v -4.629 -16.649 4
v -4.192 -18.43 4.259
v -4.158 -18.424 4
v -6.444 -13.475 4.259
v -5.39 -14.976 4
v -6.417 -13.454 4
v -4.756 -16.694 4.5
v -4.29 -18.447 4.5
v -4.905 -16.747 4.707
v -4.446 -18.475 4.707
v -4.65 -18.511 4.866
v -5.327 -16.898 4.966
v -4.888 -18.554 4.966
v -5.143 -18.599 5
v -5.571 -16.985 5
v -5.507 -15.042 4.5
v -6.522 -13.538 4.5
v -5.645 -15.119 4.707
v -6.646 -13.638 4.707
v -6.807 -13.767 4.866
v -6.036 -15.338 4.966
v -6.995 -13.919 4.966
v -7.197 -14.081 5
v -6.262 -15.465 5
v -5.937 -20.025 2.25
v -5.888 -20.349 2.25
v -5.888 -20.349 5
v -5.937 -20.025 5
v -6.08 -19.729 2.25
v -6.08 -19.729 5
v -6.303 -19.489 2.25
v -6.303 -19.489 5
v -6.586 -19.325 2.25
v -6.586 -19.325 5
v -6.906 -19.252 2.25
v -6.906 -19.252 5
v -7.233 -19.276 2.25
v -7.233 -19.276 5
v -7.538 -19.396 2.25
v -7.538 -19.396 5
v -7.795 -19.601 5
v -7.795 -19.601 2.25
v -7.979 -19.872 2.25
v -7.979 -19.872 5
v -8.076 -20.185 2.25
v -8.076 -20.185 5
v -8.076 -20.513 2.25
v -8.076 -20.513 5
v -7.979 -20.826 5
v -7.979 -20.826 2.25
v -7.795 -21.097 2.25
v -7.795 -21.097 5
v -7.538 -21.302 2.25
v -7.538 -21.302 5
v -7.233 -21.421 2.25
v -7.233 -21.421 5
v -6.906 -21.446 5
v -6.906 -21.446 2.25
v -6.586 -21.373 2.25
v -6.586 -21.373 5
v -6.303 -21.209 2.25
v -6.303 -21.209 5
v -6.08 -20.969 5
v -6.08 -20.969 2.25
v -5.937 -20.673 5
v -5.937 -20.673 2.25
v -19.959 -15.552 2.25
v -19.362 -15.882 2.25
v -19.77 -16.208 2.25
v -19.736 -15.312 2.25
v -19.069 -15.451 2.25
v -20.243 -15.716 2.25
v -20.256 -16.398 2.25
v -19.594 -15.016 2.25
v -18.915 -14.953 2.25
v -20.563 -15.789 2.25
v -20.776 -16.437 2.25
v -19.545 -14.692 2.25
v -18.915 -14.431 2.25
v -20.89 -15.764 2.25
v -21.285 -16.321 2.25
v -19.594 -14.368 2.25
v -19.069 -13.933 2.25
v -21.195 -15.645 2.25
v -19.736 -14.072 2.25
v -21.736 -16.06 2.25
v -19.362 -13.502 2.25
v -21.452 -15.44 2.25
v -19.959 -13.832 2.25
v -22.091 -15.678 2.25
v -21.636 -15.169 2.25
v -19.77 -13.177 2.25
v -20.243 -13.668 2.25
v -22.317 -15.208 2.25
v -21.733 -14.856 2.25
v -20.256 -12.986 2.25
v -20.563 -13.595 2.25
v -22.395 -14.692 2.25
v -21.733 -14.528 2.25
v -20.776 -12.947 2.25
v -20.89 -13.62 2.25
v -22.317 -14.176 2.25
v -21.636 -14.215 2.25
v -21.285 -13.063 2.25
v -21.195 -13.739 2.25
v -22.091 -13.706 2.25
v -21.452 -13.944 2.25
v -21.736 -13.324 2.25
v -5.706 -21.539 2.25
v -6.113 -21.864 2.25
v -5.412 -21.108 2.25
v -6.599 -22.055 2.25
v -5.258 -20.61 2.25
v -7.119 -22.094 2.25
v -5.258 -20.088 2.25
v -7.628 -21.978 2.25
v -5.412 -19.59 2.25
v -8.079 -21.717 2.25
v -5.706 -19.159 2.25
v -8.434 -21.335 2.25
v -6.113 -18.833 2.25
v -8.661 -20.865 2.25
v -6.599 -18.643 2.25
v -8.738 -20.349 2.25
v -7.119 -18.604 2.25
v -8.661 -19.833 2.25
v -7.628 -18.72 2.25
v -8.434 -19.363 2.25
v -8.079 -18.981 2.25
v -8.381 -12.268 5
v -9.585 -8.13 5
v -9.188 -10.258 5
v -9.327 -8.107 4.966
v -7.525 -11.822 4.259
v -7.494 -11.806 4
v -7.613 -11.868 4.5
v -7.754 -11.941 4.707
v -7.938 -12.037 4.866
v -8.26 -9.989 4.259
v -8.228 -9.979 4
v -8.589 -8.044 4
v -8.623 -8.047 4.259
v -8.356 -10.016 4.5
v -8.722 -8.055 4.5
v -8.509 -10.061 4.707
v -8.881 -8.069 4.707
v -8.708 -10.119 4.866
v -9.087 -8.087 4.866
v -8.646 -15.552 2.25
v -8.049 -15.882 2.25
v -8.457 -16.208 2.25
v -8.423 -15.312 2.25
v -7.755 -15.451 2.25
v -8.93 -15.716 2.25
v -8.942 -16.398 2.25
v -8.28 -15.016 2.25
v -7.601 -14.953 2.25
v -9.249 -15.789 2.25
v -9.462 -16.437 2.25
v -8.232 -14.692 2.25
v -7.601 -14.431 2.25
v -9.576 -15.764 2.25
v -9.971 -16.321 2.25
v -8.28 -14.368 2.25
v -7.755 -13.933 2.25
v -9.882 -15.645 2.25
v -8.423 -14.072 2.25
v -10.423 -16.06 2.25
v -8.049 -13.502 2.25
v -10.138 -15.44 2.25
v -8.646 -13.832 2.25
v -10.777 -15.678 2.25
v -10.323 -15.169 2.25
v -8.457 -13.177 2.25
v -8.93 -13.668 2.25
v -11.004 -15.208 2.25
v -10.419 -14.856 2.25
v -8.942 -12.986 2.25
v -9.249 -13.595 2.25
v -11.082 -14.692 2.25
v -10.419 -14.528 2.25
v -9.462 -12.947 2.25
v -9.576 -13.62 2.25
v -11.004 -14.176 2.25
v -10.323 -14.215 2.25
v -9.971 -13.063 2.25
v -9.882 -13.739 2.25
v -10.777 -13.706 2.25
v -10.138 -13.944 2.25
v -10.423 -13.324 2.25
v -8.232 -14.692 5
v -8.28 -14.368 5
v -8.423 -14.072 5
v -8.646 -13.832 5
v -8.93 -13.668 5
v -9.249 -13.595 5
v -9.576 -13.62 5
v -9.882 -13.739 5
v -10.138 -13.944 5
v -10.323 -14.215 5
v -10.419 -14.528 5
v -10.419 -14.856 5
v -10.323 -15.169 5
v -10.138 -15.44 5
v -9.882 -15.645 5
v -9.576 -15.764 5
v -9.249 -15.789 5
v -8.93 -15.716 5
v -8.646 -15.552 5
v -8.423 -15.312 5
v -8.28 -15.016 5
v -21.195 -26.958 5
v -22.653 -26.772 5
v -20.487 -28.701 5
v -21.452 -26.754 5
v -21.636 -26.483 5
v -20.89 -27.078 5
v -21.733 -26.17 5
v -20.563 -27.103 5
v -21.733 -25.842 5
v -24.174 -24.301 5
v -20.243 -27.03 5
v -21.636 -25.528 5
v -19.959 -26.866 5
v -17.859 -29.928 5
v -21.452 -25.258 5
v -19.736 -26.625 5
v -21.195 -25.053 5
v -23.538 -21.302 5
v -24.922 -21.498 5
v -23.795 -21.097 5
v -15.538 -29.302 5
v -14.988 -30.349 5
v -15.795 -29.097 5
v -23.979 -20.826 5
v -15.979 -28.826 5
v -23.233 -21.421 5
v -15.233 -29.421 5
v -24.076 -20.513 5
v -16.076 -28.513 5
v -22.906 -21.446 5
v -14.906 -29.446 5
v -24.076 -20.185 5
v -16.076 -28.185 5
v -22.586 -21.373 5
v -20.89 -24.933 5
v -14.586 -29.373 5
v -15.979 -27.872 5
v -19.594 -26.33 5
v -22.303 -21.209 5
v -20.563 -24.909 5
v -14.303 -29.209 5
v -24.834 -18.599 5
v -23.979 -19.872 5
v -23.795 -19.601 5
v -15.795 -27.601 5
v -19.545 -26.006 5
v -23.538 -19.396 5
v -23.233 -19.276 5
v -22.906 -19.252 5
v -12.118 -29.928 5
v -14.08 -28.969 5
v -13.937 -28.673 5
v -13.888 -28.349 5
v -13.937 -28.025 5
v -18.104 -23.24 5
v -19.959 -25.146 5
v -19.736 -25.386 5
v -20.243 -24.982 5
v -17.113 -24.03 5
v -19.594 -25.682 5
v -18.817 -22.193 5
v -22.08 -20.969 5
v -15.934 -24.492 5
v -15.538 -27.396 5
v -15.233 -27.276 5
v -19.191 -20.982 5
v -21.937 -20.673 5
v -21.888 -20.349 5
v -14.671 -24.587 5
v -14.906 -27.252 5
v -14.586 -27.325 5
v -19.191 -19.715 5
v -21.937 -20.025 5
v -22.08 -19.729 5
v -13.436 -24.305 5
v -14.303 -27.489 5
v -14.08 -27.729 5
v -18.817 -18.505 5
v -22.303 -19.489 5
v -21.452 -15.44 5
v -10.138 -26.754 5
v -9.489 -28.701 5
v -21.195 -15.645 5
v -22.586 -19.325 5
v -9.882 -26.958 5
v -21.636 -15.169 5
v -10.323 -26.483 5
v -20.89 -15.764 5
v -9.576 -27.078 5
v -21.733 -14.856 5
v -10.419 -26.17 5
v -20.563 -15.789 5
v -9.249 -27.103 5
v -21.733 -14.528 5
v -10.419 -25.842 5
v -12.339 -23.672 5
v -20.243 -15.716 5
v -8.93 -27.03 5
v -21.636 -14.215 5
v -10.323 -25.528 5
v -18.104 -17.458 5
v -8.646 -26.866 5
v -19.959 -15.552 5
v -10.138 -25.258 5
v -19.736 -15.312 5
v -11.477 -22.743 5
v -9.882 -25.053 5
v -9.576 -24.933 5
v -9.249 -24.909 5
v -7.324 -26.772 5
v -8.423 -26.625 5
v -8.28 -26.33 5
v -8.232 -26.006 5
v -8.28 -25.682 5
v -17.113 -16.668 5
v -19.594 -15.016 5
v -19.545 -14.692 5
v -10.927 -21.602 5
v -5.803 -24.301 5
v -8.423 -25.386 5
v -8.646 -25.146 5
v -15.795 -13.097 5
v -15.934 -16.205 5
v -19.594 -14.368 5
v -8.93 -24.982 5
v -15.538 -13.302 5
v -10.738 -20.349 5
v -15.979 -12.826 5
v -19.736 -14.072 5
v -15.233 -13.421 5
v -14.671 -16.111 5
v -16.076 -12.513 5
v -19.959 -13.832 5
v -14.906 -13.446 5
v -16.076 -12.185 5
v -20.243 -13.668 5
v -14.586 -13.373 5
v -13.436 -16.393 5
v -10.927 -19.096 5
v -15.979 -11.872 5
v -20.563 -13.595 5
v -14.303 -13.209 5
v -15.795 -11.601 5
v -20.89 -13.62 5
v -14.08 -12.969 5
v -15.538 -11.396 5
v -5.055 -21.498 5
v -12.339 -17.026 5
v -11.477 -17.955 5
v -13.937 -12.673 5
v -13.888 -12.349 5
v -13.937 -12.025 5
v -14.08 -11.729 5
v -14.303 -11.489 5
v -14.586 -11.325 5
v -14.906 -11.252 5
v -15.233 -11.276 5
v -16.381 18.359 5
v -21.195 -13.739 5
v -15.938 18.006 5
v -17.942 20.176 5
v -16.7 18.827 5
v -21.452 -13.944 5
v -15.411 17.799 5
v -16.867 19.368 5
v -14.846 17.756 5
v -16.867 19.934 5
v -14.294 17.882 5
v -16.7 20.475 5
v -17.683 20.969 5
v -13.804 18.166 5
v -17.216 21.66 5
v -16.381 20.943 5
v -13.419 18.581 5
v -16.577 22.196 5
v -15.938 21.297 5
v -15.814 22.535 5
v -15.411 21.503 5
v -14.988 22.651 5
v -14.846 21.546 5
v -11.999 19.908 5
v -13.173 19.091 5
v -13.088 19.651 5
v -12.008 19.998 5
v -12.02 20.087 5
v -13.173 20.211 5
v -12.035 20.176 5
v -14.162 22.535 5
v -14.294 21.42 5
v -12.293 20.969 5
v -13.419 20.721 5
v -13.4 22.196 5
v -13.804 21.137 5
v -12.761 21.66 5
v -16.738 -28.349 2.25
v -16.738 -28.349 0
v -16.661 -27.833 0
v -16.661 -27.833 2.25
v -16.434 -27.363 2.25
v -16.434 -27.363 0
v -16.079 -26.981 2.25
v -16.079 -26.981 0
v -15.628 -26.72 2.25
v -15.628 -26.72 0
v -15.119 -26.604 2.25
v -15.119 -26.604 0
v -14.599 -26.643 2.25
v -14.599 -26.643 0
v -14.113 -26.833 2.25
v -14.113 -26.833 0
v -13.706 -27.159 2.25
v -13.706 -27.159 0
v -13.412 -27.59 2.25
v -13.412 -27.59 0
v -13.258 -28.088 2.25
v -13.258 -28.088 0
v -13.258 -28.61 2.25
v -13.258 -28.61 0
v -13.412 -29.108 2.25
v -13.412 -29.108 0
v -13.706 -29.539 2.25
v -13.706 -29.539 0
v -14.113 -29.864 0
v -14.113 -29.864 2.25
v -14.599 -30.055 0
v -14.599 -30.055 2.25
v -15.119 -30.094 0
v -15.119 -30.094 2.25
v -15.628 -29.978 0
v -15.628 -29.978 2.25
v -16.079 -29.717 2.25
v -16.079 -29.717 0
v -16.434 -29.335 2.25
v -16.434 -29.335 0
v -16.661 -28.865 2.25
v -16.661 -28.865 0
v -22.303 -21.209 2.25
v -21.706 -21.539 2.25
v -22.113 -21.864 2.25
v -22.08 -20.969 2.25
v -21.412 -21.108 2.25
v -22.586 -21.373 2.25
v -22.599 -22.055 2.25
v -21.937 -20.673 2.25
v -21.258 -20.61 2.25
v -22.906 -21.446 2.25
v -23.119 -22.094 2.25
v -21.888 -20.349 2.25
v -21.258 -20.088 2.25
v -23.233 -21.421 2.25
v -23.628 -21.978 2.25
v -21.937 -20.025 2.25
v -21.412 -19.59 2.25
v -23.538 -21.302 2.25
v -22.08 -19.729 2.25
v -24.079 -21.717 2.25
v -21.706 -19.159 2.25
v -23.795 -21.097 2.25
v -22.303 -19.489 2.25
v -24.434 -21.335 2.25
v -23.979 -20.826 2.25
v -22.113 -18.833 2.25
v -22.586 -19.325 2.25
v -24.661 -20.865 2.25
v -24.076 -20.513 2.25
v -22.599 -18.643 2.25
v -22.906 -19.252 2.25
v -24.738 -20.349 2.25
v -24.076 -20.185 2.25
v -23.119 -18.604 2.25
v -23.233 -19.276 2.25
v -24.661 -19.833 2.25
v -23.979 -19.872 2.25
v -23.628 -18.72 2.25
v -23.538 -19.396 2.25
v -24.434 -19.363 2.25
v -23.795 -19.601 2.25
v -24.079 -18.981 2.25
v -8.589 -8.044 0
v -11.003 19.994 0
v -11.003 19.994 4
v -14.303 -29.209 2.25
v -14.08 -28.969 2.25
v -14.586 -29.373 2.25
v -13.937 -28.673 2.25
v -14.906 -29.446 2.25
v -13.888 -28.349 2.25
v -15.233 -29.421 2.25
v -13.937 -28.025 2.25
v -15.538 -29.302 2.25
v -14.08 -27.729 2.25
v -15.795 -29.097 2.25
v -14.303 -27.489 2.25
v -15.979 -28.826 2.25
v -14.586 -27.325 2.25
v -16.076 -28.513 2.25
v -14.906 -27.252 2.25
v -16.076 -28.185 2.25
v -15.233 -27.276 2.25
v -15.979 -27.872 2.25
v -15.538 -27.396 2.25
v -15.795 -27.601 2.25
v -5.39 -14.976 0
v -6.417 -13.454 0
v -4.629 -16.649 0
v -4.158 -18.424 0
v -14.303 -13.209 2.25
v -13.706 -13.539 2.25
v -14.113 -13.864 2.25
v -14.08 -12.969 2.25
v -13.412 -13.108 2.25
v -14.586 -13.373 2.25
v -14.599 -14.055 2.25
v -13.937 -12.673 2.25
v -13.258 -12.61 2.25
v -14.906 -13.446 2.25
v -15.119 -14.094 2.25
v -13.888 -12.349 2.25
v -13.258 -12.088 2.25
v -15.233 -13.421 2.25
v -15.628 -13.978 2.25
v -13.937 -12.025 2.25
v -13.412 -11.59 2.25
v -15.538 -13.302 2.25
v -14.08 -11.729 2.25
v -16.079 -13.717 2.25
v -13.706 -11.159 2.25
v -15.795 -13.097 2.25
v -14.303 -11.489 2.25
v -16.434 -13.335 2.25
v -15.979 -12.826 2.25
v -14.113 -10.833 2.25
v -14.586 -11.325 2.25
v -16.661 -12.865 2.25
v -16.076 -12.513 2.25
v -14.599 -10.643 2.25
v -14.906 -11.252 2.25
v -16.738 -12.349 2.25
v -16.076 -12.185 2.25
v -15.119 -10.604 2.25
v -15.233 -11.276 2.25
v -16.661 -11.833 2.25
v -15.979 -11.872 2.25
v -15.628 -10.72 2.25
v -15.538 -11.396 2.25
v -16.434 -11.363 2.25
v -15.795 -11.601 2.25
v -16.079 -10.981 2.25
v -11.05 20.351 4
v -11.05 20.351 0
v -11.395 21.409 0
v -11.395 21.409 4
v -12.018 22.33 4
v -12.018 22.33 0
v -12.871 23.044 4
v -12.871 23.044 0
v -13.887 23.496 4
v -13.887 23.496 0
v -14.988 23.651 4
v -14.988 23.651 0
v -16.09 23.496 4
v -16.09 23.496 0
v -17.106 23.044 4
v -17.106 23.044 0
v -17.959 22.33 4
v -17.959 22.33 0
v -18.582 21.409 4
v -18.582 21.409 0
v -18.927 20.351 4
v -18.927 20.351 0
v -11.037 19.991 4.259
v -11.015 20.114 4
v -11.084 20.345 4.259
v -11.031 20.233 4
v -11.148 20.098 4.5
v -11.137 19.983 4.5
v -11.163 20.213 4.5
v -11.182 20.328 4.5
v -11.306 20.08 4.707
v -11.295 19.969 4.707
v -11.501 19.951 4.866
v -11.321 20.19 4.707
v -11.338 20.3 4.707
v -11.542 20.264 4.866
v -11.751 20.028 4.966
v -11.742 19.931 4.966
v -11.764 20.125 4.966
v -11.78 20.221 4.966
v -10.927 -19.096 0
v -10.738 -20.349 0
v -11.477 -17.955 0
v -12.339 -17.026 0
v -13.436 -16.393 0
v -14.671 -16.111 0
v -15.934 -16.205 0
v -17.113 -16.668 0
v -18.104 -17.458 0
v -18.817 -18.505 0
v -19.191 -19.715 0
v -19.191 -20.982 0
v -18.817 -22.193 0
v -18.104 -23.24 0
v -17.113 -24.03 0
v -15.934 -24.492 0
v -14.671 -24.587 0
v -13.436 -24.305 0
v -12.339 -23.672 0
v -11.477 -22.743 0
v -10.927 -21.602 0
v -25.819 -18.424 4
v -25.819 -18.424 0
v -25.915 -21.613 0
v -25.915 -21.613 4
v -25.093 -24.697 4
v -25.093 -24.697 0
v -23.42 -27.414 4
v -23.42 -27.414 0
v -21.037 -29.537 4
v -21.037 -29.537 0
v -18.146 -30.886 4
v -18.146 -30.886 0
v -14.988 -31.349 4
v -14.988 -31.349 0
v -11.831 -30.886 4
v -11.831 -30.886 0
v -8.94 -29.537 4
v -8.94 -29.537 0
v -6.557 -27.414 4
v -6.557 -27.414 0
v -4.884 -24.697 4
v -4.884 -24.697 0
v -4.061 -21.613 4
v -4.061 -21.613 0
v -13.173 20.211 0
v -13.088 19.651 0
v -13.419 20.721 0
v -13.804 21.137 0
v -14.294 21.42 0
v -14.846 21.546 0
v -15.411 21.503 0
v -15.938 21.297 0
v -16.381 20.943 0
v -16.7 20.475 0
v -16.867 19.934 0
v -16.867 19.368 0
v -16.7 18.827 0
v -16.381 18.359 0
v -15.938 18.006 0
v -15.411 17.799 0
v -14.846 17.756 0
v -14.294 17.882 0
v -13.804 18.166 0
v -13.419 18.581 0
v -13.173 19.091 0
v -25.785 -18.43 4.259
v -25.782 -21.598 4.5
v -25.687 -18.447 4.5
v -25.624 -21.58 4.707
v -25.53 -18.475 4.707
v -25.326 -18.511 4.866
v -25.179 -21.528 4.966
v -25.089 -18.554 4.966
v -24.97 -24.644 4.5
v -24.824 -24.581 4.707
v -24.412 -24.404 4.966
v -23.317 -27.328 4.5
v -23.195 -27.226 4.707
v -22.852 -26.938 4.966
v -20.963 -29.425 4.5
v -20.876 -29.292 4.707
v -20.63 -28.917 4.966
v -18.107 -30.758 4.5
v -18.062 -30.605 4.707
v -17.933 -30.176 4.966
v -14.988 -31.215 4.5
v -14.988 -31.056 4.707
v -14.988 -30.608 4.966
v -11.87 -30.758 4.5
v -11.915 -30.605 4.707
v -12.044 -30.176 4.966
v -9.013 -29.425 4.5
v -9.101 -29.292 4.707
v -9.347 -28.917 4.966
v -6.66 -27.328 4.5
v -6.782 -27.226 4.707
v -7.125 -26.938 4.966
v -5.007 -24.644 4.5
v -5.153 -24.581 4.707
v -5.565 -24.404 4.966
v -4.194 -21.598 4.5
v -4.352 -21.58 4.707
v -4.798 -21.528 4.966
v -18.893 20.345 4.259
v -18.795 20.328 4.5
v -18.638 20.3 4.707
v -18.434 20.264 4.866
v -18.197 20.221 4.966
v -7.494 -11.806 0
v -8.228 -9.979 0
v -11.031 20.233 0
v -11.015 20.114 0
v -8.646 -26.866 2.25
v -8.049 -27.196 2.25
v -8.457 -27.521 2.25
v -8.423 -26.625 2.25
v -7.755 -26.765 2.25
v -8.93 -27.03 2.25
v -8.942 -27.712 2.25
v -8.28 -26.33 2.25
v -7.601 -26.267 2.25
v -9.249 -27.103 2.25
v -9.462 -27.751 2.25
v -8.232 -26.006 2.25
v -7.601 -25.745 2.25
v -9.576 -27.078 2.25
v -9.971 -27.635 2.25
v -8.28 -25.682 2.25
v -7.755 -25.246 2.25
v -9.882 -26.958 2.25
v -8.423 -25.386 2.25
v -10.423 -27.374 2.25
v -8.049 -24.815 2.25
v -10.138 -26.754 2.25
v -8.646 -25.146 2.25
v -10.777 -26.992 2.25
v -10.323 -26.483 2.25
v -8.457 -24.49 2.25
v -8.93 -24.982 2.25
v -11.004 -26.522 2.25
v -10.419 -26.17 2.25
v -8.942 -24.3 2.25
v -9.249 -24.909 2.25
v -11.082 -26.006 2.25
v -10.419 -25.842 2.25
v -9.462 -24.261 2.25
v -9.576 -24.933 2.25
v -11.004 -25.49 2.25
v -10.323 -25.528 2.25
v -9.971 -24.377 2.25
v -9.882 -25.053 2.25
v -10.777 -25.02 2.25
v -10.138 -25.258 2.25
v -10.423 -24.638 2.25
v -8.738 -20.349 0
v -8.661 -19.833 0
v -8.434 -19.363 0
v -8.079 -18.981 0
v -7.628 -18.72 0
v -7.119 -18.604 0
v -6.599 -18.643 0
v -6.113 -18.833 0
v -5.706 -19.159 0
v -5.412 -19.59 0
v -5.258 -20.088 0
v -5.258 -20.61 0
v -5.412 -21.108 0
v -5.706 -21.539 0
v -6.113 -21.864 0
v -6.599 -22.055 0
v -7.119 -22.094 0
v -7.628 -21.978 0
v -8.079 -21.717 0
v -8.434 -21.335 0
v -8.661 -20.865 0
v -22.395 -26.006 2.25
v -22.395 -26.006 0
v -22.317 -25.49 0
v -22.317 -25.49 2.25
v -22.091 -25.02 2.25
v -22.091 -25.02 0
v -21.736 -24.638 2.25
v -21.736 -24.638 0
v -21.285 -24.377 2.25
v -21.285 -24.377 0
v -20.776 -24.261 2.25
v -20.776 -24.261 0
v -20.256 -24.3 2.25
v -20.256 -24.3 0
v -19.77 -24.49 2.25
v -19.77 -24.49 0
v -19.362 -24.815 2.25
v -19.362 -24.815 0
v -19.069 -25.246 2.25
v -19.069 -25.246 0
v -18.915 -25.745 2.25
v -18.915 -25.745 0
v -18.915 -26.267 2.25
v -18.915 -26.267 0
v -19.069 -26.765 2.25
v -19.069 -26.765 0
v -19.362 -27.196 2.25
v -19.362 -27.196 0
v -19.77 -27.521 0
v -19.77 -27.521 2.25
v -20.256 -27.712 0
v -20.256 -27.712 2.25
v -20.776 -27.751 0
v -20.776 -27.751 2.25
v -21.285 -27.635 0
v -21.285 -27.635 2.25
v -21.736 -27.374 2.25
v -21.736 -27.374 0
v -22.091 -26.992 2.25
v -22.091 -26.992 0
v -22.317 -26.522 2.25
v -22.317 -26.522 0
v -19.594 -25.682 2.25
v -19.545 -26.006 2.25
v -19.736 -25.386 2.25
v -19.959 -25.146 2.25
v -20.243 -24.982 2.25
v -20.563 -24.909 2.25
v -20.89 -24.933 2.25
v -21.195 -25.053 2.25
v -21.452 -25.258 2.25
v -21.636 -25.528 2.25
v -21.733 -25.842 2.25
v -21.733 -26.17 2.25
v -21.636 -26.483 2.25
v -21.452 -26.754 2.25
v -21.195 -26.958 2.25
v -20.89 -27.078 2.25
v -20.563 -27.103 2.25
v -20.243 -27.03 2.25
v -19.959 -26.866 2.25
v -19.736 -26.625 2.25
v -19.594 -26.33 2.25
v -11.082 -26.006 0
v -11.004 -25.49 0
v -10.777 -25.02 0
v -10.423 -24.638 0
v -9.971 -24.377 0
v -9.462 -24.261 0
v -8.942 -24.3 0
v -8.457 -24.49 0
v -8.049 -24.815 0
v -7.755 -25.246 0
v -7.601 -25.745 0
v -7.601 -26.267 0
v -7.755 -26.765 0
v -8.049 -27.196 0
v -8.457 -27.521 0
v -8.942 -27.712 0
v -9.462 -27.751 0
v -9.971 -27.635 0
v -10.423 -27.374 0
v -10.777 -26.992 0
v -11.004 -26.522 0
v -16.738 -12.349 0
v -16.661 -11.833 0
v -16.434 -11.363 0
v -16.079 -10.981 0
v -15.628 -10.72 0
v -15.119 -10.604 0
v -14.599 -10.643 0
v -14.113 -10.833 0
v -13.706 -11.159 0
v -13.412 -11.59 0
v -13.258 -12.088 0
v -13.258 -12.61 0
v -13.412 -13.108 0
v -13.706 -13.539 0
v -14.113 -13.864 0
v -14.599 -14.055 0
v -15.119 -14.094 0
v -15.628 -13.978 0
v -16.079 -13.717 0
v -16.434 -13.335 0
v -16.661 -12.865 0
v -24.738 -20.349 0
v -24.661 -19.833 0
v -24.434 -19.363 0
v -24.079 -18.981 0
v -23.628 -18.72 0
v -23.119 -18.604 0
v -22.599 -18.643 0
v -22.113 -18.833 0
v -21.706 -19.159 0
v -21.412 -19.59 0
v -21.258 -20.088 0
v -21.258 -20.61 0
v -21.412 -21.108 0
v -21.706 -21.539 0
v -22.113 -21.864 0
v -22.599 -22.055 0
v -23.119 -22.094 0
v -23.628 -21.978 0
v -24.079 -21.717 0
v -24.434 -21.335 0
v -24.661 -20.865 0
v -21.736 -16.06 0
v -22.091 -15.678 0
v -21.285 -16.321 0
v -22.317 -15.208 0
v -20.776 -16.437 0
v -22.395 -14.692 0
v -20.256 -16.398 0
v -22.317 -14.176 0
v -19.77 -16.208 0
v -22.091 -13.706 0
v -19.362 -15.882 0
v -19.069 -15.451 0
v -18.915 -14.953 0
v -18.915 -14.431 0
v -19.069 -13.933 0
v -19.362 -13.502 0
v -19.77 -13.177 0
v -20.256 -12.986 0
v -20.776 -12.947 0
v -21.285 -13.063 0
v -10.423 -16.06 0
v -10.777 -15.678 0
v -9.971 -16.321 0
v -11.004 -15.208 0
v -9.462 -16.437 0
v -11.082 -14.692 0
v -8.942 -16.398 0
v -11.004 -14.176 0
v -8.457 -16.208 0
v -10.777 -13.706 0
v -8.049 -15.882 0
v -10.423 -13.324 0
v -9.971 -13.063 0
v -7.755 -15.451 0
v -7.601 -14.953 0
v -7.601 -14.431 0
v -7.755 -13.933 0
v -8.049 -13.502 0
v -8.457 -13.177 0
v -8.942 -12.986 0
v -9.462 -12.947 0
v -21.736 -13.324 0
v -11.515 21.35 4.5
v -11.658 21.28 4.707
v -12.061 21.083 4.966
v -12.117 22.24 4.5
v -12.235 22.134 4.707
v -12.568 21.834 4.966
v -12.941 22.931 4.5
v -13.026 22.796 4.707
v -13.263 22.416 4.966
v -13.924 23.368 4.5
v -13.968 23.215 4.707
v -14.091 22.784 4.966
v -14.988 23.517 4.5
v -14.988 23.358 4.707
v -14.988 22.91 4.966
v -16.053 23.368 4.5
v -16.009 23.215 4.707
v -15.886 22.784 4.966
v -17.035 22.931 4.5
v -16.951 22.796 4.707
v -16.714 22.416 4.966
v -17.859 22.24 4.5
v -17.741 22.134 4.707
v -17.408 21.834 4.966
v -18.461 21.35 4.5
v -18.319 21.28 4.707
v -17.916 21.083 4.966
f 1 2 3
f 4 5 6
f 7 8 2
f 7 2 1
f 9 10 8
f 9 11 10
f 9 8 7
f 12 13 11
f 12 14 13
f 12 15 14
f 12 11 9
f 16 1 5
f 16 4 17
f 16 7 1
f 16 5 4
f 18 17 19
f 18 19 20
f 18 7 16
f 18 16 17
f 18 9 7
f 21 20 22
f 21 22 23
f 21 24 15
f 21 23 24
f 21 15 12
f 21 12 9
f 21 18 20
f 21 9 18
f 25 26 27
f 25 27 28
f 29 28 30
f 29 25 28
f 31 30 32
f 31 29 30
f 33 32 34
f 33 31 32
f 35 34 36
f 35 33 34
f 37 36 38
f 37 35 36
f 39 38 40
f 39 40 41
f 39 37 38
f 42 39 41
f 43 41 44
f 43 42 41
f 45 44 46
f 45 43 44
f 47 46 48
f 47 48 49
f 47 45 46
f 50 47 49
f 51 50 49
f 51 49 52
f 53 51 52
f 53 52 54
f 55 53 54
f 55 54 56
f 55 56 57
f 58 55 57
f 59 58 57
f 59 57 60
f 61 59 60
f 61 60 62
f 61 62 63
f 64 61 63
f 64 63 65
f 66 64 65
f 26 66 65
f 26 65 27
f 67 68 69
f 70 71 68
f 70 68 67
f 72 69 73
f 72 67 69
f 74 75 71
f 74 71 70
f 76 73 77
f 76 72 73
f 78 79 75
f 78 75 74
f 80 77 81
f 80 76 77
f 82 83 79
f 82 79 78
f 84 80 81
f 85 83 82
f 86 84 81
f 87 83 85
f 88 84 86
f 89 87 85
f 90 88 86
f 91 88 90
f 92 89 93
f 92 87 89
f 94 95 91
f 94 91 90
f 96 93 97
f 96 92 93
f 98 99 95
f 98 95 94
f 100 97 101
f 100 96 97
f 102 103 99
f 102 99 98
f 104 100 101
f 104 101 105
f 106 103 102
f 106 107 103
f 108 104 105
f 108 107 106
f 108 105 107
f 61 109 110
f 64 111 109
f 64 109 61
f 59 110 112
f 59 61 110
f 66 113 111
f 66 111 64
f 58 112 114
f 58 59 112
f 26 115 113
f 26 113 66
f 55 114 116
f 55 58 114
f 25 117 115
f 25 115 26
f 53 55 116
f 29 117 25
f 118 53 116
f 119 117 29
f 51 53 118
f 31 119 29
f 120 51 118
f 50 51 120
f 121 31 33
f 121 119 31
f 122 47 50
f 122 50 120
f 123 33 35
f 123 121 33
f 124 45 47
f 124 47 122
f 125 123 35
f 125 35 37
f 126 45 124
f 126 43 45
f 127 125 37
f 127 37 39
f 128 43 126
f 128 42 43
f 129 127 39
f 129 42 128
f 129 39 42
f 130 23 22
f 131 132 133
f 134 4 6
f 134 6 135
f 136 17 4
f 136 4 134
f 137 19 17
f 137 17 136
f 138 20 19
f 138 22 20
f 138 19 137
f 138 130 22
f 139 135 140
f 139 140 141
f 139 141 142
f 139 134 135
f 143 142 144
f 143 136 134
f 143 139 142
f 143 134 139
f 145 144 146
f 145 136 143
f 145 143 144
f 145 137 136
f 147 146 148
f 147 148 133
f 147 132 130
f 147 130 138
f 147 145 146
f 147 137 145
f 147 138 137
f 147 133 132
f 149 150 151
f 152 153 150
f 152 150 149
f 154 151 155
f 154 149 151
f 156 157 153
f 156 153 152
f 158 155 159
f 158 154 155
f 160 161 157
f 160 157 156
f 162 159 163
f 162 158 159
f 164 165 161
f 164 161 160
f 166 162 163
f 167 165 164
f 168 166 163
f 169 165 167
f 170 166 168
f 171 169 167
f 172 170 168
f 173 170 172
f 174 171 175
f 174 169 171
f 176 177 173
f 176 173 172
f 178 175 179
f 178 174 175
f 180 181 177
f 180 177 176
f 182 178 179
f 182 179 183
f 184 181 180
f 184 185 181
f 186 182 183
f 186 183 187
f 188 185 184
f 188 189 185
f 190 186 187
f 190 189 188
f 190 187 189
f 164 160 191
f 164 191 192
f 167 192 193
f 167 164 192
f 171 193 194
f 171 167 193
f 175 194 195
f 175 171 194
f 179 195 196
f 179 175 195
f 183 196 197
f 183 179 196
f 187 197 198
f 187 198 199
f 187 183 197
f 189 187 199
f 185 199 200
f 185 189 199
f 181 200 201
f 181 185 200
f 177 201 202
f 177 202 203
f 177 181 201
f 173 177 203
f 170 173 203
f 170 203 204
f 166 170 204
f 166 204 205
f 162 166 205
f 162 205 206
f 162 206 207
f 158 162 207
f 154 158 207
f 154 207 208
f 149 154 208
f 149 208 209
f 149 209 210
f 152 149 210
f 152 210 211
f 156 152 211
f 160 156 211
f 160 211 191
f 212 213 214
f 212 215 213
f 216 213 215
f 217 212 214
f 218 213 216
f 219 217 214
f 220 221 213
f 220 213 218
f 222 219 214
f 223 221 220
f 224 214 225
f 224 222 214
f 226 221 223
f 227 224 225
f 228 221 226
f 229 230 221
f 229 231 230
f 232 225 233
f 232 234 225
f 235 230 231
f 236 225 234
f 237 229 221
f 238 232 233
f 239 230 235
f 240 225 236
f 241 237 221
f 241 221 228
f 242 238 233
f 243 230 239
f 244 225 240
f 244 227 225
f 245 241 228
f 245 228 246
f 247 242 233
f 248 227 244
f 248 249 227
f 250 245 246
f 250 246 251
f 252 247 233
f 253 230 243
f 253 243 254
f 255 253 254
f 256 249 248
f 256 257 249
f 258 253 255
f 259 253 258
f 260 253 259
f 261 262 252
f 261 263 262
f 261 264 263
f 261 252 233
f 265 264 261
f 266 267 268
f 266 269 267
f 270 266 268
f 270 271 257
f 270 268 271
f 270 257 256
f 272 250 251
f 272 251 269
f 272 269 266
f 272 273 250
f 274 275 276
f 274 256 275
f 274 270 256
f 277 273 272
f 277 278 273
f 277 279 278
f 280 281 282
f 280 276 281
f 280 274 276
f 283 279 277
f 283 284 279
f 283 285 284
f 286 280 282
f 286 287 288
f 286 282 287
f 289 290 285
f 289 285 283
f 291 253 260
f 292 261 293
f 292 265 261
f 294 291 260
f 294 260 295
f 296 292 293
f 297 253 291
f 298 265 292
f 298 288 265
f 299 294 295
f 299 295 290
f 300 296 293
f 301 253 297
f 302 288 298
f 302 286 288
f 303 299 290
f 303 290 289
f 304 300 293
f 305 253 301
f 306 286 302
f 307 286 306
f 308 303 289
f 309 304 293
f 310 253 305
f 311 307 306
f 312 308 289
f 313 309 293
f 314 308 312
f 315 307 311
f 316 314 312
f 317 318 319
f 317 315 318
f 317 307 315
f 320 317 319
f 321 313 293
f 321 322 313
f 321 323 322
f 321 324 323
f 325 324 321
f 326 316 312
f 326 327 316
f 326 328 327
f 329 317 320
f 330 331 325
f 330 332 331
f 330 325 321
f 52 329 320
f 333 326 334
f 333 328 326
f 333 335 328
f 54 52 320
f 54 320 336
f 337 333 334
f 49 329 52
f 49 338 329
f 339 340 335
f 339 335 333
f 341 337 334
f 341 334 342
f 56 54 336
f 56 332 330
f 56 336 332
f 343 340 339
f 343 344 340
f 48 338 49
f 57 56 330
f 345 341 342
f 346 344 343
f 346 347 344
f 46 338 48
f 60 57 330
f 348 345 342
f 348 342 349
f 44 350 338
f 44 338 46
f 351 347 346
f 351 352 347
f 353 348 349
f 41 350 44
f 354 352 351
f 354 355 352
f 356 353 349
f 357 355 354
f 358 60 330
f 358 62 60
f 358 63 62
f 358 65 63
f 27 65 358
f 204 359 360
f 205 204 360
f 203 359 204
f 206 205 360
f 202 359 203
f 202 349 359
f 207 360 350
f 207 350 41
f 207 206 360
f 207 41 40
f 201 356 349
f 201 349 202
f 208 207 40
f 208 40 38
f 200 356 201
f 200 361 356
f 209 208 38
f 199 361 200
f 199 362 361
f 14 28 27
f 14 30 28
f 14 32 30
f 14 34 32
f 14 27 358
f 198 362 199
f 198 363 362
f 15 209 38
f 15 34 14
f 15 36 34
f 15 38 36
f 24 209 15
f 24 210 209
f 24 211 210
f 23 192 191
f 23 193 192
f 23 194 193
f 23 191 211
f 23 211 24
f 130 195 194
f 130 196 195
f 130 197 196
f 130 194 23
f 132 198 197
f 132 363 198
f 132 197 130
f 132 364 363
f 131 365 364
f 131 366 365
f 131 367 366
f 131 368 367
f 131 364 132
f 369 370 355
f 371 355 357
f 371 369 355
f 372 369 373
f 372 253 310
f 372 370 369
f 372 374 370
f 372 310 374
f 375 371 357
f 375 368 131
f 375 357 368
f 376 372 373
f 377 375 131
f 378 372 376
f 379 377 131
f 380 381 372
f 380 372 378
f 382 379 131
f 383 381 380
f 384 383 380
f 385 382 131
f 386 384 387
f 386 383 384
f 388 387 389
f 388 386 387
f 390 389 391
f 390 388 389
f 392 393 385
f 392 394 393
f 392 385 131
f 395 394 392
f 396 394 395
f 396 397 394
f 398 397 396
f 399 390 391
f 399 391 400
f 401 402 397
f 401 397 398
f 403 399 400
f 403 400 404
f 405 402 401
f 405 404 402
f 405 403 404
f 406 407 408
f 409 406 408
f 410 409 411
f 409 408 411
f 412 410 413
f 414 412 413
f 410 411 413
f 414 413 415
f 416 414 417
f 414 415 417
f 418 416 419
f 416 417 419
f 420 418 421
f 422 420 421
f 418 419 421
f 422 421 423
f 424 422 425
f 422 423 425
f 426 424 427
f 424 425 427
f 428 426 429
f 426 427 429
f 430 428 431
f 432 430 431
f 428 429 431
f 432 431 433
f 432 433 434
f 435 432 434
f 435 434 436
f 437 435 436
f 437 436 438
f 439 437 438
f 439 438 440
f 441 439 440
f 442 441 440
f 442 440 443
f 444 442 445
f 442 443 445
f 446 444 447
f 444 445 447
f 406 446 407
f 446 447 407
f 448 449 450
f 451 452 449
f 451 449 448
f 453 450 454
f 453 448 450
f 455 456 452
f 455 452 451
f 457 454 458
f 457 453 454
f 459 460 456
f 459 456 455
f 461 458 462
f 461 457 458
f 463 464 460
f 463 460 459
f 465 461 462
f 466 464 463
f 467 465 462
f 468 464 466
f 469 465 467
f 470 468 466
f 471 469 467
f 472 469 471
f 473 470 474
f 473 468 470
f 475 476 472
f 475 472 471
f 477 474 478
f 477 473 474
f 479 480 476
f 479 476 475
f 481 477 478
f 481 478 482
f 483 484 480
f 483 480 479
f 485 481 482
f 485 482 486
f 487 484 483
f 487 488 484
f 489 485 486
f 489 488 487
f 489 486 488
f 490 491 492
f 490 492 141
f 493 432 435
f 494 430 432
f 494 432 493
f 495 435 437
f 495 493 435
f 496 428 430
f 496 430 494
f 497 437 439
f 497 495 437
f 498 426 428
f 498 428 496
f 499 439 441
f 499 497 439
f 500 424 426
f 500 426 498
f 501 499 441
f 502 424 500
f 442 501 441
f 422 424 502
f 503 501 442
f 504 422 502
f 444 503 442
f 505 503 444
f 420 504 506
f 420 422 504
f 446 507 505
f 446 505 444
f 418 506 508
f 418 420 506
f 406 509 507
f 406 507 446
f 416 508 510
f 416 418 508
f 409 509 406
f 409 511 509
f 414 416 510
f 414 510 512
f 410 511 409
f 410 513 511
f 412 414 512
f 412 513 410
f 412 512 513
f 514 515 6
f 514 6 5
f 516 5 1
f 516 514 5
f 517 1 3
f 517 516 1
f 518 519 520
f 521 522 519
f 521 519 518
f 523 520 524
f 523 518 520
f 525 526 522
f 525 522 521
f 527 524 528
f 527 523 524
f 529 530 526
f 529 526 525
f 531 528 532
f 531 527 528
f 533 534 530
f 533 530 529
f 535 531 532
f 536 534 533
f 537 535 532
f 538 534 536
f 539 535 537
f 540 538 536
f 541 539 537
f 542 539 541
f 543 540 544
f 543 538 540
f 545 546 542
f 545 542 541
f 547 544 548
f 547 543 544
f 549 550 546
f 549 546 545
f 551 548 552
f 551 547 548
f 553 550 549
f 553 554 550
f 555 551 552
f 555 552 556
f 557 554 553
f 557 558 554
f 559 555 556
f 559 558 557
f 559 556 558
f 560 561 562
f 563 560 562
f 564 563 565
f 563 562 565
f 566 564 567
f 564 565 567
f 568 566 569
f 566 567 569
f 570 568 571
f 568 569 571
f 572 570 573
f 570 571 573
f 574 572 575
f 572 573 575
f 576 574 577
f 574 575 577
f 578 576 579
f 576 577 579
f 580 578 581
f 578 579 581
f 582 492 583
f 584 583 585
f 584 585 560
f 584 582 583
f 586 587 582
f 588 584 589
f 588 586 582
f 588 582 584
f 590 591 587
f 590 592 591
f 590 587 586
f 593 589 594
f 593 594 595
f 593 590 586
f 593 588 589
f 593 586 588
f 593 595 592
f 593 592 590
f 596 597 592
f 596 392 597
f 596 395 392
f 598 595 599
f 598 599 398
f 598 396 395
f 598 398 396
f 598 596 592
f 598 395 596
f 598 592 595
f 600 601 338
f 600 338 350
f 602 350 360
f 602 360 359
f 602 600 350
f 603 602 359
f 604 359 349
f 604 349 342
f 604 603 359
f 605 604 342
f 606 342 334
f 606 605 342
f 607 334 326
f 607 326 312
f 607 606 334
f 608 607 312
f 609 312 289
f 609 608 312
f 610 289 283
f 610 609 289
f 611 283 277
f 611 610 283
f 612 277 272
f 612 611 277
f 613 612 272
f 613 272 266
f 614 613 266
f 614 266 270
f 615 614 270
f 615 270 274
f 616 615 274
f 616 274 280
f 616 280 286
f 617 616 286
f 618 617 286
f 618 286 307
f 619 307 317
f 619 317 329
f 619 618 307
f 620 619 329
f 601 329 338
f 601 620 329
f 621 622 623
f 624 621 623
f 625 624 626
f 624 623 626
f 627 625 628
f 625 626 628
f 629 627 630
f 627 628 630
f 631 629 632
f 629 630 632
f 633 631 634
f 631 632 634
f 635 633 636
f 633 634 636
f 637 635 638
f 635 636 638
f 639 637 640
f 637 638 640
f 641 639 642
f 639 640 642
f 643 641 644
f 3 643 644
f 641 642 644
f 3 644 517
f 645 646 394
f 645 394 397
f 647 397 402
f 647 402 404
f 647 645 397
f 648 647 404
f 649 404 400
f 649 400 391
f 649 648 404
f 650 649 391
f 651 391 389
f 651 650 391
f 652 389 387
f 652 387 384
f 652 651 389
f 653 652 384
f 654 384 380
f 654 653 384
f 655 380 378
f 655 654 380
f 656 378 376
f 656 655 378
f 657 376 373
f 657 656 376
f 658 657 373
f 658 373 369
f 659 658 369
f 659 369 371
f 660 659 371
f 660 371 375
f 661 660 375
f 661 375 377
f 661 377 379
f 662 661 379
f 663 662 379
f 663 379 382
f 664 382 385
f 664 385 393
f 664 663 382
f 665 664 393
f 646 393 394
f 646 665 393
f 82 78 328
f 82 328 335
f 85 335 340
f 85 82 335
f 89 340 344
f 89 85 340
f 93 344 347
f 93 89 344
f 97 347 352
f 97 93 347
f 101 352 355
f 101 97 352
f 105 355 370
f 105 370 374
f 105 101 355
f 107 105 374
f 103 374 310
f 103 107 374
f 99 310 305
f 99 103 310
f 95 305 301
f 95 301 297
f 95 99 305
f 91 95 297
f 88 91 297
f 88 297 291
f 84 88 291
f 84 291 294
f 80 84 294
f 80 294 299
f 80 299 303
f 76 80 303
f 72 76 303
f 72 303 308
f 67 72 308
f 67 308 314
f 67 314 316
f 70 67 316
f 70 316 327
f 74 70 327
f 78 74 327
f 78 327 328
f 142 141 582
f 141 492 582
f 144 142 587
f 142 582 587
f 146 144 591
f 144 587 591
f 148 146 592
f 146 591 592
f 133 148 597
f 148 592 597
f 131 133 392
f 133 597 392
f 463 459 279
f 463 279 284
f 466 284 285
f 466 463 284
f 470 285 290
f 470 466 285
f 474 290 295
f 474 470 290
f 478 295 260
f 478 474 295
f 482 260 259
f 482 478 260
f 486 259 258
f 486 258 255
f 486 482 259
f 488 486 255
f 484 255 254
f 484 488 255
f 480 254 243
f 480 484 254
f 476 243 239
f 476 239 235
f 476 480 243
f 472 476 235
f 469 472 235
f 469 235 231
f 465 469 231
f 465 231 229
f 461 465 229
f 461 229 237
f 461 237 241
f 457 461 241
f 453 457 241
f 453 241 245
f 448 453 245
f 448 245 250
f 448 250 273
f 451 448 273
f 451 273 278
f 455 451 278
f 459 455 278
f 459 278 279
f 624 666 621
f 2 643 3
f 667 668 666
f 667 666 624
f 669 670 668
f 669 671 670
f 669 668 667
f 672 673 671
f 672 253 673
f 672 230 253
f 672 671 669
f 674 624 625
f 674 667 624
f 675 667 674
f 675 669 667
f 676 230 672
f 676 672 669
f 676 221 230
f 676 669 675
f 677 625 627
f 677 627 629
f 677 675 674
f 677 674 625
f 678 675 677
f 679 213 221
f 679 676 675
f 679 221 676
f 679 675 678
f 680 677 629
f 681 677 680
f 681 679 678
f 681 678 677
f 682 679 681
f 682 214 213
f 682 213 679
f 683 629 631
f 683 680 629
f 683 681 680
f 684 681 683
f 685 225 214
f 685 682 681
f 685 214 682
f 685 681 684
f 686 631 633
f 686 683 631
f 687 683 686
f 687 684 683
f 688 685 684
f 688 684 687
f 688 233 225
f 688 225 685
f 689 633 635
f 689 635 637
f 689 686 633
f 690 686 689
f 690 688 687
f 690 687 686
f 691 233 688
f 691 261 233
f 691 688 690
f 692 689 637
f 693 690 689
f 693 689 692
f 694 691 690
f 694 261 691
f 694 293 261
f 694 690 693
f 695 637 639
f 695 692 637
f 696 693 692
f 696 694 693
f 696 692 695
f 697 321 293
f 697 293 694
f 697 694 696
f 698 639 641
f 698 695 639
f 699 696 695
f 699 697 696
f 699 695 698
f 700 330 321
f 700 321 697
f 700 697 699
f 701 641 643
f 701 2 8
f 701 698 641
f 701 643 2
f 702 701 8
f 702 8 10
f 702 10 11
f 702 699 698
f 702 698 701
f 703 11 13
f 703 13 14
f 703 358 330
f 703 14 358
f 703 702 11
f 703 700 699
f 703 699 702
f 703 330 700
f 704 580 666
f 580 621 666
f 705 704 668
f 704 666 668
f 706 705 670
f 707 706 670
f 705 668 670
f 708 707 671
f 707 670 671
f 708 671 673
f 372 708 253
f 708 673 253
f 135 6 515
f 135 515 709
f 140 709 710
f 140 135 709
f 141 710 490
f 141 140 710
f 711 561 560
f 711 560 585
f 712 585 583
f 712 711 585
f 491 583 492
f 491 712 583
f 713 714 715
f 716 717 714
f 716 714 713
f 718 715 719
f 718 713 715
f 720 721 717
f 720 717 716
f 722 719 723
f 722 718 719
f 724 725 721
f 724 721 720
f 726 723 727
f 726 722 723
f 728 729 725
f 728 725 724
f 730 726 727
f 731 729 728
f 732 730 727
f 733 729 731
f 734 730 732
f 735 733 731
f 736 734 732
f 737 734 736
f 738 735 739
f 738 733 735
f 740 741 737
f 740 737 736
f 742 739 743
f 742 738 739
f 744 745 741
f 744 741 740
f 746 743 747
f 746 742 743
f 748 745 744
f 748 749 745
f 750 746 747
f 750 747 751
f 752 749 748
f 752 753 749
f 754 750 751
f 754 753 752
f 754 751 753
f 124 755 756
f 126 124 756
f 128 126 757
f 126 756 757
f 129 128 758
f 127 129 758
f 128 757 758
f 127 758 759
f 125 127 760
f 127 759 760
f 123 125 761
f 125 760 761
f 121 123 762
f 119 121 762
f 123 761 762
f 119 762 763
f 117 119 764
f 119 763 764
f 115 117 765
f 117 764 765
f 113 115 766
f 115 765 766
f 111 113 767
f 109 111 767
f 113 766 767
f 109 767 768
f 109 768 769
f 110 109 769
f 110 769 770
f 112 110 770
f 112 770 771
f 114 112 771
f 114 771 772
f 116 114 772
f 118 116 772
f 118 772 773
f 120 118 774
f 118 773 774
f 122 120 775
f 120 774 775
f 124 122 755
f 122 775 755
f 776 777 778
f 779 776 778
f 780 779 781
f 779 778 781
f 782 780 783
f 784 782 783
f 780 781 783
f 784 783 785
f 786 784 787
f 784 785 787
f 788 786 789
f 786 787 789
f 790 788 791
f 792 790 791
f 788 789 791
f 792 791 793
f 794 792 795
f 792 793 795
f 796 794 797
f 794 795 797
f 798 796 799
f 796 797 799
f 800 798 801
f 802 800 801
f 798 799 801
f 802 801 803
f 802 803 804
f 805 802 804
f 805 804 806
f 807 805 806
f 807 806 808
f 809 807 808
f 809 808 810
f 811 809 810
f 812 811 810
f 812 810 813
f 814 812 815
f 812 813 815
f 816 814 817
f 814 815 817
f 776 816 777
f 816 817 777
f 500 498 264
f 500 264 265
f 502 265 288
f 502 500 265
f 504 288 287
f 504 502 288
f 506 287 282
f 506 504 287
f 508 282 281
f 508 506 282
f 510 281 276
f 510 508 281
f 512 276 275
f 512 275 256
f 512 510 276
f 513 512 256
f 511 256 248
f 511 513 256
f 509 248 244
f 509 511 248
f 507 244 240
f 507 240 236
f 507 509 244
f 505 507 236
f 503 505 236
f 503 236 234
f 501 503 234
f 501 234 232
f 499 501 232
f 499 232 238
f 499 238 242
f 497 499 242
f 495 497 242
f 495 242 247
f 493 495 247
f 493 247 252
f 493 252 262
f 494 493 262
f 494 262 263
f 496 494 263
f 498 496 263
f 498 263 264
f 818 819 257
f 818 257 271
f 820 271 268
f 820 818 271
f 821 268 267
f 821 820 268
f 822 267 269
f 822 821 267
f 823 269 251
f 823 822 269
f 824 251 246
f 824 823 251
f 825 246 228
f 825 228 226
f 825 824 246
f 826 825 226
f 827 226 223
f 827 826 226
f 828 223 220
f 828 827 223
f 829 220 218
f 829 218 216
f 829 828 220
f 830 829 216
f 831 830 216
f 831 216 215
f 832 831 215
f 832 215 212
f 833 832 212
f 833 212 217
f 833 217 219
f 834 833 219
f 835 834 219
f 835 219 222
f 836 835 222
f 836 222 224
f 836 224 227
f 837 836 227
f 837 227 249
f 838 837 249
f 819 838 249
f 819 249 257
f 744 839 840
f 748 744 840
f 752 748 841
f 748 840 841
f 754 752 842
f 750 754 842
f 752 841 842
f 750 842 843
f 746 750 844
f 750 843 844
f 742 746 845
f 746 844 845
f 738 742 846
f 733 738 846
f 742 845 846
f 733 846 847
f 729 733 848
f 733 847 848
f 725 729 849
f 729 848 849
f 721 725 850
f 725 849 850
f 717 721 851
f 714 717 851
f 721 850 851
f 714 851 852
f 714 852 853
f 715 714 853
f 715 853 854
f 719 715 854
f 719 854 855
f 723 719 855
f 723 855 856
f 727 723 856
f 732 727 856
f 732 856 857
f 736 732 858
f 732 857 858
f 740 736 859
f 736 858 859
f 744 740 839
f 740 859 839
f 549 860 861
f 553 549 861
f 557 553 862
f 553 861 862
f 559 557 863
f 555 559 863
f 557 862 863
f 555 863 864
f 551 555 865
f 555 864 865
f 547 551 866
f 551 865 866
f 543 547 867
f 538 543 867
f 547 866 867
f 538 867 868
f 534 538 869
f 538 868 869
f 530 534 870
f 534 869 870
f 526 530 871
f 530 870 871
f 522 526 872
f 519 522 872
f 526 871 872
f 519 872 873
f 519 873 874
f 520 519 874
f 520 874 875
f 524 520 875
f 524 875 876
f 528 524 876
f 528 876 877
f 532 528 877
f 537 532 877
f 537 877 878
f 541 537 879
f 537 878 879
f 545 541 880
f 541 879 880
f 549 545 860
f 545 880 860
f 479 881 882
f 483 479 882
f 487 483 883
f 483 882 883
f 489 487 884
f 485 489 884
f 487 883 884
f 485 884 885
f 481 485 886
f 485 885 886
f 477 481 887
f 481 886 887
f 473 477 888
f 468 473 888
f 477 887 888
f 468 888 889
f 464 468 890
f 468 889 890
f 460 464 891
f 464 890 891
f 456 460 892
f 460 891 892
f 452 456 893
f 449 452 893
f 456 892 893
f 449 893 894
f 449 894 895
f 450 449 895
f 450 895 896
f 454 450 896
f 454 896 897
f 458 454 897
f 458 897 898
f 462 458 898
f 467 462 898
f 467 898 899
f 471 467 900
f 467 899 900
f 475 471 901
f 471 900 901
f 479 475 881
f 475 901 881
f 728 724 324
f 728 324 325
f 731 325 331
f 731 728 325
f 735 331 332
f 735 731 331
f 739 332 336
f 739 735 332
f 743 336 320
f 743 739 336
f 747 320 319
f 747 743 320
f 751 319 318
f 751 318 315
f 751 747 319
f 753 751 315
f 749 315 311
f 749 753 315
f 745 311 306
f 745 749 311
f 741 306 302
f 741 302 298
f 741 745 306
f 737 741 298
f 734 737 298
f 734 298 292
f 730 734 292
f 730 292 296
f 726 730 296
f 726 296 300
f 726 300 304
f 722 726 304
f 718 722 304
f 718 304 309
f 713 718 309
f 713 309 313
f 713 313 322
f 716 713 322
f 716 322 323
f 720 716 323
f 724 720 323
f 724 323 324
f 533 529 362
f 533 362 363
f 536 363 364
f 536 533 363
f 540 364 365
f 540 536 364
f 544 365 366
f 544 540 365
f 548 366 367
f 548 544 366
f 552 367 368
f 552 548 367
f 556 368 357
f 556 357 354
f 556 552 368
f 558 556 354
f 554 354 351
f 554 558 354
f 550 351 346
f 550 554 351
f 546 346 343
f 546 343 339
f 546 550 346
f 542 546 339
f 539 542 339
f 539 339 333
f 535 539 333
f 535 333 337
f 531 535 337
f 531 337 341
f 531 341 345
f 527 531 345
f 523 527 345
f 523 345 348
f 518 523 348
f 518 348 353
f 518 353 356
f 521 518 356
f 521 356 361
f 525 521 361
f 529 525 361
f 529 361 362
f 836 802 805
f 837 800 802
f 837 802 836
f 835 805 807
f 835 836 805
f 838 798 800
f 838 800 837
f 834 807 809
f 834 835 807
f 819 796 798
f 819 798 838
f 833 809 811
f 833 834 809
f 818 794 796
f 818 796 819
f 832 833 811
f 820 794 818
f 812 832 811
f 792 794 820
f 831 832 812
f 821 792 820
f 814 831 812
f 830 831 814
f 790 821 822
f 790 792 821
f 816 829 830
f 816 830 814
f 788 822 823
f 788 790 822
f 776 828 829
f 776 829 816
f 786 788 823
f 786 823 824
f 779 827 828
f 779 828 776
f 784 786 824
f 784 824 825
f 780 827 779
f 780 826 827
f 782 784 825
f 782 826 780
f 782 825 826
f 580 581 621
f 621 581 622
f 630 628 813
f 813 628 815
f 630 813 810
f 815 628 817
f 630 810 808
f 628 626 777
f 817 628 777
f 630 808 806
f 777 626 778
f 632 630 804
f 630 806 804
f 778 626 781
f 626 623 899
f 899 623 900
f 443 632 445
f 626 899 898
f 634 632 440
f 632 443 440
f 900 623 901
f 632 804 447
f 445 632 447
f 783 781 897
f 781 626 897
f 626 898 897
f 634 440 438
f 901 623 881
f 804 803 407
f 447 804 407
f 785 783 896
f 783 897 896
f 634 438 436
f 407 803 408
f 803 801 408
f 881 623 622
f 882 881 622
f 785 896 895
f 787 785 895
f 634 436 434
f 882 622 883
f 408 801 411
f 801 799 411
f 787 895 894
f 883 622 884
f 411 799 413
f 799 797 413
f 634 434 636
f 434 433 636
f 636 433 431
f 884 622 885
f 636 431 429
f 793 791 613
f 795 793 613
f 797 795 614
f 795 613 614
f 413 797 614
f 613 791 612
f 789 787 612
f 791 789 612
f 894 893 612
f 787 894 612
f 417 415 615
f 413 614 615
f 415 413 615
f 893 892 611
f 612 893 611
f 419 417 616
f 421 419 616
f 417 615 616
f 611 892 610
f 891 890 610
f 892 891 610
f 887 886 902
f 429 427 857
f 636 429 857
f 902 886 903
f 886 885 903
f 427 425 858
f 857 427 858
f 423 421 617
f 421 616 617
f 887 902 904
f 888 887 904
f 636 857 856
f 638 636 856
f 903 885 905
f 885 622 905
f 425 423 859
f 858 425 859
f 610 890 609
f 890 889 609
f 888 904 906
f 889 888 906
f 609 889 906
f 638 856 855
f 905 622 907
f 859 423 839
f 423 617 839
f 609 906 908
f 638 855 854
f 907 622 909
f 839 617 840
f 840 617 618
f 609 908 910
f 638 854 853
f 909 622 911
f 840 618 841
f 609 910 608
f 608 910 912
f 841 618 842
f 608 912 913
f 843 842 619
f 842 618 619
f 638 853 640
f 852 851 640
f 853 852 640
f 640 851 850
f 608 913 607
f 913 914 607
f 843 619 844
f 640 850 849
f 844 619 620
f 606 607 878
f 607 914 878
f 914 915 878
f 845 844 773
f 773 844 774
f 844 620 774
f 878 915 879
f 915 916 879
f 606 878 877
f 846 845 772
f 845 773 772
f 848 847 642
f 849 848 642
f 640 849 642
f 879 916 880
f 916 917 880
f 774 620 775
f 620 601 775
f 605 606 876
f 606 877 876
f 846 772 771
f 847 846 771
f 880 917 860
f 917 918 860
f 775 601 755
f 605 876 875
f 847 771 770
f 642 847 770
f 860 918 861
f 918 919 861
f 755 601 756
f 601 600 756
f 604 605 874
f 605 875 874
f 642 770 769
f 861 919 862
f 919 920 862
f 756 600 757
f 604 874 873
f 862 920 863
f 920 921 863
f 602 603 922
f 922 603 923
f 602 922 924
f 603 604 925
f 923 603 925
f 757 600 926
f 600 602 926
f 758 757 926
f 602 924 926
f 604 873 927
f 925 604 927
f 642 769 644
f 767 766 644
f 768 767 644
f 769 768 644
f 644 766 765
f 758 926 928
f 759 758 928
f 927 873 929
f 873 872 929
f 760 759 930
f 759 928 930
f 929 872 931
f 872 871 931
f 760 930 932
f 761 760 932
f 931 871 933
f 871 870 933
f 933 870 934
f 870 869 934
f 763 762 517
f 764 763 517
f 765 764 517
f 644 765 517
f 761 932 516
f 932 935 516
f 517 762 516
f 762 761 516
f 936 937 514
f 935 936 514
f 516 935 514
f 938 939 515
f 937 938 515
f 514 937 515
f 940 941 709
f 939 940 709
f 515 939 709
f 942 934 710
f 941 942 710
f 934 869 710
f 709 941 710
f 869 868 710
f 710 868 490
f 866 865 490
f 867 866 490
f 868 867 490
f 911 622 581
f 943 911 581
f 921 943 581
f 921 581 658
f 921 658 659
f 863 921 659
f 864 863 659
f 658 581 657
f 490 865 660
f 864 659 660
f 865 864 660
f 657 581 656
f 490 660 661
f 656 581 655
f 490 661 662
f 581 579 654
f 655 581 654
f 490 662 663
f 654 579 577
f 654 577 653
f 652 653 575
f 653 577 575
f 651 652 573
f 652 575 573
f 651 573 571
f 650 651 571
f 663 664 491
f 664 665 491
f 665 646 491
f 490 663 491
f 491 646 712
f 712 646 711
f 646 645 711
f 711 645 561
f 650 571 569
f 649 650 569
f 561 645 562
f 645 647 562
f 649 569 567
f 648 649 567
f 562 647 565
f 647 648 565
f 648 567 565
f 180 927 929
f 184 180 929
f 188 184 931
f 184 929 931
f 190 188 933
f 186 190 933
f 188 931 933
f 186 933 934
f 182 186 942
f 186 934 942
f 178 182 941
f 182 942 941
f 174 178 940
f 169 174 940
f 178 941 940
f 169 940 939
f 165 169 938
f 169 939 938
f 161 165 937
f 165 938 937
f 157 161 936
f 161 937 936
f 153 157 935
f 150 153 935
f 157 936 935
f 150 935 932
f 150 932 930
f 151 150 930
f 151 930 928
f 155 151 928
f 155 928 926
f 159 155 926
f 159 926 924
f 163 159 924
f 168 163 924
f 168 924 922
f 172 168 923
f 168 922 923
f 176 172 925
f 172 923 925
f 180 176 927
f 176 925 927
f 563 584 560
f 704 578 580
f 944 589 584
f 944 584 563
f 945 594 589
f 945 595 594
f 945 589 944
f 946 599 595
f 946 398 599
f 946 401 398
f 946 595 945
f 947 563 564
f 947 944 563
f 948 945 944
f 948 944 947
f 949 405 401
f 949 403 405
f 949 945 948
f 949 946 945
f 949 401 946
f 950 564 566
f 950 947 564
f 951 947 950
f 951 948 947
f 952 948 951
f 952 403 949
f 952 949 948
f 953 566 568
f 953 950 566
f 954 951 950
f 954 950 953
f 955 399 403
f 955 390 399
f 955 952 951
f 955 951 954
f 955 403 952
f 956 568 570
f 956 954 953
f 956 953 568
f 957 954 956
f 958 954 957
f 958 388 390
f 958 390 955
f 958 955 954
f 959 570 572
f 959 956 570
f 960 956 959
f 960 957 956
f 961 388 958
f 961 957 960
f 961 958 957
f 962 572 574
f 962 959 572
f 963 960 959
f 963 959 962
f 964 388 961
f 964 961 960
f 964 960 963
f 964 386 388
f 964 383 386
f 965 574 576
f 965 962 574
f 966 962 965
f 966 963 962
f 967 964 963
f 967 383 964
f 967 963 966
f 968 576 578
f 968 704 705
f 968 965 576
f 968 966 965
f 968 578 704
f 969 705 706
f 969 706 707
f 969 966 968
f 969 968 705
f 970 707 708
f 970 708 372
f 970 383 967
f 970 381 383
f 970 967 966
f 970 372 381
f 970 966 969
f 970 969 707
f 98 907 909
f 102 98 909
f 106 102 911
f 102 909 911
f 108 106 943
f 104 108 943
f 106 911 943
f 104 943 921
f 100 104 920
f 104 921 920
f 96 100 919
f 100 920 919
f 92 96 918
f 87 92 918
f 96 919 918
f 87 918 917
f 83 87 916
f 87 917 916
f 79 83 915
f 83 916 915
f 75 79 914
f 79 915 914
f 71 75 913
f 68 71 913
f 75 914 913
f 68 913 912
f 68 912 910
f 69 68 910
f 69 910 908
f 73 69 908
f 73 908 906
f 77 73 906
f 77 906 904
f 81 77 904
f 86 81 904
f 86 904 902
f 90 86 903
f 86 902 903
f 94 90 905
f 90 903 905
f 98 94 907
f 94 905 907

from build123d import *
from build123d.topology import SkipClean

# Parameters (mm, degrees)
SKETCH1_R             = 1.9
SKETCH1_R_2           = 4.25
SKETCH1_R_3           = 1.1
BOSS_EXTRUDE1_DEPTH   = 5
SKETCH4_R             = 1.75
CUT_EXTRUDE3_DEPTH    = 2.25
CORTAR_EXTRUIR1_DEPTH = 10
REDONDEO1_R           = 10
REDONDEO3_R           = 1


with BuildPart() as part:
    # Sketch1 → Boss-Extrude1 (new body)
    with BuildSketch(Plane.XY):
        with BuildLine():
            Line((-18.926637777, 20.351096398), (-25.818616811, -18.423903602))
            ThreePointArc((-25.818616811, -18.423903602), (-14.988364044, -31.348903602), (-4.158111277, -18.423903602))
            Line((-4.158111277, -18.423903602), (-11.05009031, 20.351096398))
            ThreePointArc((-11.05009031, 20.351096398), (-14.988364044, 23.651096398), (-18.926637777, 20.351096398))
        make_face()
        with Locations((-14.988364044, 19.651096398)):
            Circle(SKETCH1_R, mode=Mode.SUBTRACT)
        with Locations((-14.988364044, -20.348903602)):
            Circle(SKETCH1_R_2, mode=Mode.SUBTRACT)
        with Locations((-6.988364044, -20.348903602)):
            Circle(SKETCH1_R_3, mode=Mode.SUBTRACT)
        with Locations((-9.331509794, -26.005757851)):
            Circle(SKETCH1_R_3, mode=Mode.SUBTRACT)
        with Locations((-14.988364044, -28.348903602)):
            Circle(SKETCH1_R_3, mode=Mode.SUBTRACT)
        with Locations((-20.645218293, -26.005757851)):
            Circle(SKETCH1_R_3, mode=Mode.SUBTRACT)
        with Locations((-22.988364044, -20.348903602)):
            Circle(SKETCH1_R_3, mode=Mode.SUBTRACT)
        with Locations((-20.645218293, -14.692049352)):
            Circle(SKETCH1_R_3, mode=Mode.SUBTRACT)
        with Locations((-14.988364044, -12.348903602)):
            Circle(SKETCH1_R_3, mode=Mode.SUBTRACT)
        with Locations((-9.331509794, -14.692049352)):
            Circle(SKETCH1_R_3, mode=Mode.SUBTRACT)
    extrude(amount=BOSS_EXTRUDE1_DEPTH)

    # Sketch4 → Cut-Extrude3 (cut)
    with BuildSketch(Plane(origin=(0, 0, 0), x_dir=(-1, 0, 0), z_dir=(0, 0, -1))):
        with Locations((22.988364044, -20.348903602)):
            Circle(SKETCH4_R)
        with Locations((20.645218293, -26.005757851)):
            Circle(SKETCH4_R)
        with Locations((14.988364044, -28.348903602)):
            Circle(SKETCH4_R)
        with Locations((9.331509794, -26.005757851)):
            Circle(SKETCH4_R)
        with Locations((6.988364044, -20.348903602)):
            Circle(SKETCH4_R)
        with Locations((9.331509794, -14.692049352)):
            Circle(SKETCH4_R)
        with Locations((14.988364044, -12.348903602)):
            Circle(SKETCH4_R)
        with Locations((20.645218293, -14.692049352)):
            Circle(SKETCH4_R)
    extrude(amount=-CUT_EXTRUDE3_DEPTH, mode=Mode.SUBTRACT)

    # Croquis1 → Cortar-Extruir1 (cut)
    with SkipClean():  # the faces are left unmerged after this step: merging them gives an invalid solid
        with BuildSketch(Plane(origin=(0, 0, 0), x_dir=(-1, 0, 0), z_dir=(0, 0, -1))):
            with BuildLine():
                Line((11.003110402, 19.994248567), (8.279982388, -11.631242473))
                ThreePointArc((8.279982388, -11.631242473), (5.584323122, -14.642414809), (4.158111277, -18.423903602))
                Line((4.158111277, -18.423903602), (11.05009031, 20.351096398))
                ThreePointArc((11.05009031, 20.351096398), (11.022584598, 20.173201167), (11.003110402, 19.994248567))
            make_face()
        extrude(amount=-CORTAR_EXTRUIR1_DEPTH, mode=Mode.SUBTRACT)

    # Redondeo1
    redondeo1_edges = [part.edges().sort_by_distance(p)[0] for p in [
        (-8.279982388, -11.631242473, 2.5),
    ]]
    fillet(redondeo1_edges, radius=REDONDEO1_R)

    # Redondeo3
    redondeo3_edges = [part.edges().sort_by_distance(p)[0] for p in [
        (-14.988364044, -31.348903602, 5),
        (-9.795996729, 5.975237179, 5),
        (-7.906176898, -10.910629635, 5),
        (-14.988364044, 23.651096398, 5),
        (-22.372627294, 0.963596398, 5),
    ]]
    fillet(redondeo3_edges, radius=REDONDEO3_R)


solid = part.part
